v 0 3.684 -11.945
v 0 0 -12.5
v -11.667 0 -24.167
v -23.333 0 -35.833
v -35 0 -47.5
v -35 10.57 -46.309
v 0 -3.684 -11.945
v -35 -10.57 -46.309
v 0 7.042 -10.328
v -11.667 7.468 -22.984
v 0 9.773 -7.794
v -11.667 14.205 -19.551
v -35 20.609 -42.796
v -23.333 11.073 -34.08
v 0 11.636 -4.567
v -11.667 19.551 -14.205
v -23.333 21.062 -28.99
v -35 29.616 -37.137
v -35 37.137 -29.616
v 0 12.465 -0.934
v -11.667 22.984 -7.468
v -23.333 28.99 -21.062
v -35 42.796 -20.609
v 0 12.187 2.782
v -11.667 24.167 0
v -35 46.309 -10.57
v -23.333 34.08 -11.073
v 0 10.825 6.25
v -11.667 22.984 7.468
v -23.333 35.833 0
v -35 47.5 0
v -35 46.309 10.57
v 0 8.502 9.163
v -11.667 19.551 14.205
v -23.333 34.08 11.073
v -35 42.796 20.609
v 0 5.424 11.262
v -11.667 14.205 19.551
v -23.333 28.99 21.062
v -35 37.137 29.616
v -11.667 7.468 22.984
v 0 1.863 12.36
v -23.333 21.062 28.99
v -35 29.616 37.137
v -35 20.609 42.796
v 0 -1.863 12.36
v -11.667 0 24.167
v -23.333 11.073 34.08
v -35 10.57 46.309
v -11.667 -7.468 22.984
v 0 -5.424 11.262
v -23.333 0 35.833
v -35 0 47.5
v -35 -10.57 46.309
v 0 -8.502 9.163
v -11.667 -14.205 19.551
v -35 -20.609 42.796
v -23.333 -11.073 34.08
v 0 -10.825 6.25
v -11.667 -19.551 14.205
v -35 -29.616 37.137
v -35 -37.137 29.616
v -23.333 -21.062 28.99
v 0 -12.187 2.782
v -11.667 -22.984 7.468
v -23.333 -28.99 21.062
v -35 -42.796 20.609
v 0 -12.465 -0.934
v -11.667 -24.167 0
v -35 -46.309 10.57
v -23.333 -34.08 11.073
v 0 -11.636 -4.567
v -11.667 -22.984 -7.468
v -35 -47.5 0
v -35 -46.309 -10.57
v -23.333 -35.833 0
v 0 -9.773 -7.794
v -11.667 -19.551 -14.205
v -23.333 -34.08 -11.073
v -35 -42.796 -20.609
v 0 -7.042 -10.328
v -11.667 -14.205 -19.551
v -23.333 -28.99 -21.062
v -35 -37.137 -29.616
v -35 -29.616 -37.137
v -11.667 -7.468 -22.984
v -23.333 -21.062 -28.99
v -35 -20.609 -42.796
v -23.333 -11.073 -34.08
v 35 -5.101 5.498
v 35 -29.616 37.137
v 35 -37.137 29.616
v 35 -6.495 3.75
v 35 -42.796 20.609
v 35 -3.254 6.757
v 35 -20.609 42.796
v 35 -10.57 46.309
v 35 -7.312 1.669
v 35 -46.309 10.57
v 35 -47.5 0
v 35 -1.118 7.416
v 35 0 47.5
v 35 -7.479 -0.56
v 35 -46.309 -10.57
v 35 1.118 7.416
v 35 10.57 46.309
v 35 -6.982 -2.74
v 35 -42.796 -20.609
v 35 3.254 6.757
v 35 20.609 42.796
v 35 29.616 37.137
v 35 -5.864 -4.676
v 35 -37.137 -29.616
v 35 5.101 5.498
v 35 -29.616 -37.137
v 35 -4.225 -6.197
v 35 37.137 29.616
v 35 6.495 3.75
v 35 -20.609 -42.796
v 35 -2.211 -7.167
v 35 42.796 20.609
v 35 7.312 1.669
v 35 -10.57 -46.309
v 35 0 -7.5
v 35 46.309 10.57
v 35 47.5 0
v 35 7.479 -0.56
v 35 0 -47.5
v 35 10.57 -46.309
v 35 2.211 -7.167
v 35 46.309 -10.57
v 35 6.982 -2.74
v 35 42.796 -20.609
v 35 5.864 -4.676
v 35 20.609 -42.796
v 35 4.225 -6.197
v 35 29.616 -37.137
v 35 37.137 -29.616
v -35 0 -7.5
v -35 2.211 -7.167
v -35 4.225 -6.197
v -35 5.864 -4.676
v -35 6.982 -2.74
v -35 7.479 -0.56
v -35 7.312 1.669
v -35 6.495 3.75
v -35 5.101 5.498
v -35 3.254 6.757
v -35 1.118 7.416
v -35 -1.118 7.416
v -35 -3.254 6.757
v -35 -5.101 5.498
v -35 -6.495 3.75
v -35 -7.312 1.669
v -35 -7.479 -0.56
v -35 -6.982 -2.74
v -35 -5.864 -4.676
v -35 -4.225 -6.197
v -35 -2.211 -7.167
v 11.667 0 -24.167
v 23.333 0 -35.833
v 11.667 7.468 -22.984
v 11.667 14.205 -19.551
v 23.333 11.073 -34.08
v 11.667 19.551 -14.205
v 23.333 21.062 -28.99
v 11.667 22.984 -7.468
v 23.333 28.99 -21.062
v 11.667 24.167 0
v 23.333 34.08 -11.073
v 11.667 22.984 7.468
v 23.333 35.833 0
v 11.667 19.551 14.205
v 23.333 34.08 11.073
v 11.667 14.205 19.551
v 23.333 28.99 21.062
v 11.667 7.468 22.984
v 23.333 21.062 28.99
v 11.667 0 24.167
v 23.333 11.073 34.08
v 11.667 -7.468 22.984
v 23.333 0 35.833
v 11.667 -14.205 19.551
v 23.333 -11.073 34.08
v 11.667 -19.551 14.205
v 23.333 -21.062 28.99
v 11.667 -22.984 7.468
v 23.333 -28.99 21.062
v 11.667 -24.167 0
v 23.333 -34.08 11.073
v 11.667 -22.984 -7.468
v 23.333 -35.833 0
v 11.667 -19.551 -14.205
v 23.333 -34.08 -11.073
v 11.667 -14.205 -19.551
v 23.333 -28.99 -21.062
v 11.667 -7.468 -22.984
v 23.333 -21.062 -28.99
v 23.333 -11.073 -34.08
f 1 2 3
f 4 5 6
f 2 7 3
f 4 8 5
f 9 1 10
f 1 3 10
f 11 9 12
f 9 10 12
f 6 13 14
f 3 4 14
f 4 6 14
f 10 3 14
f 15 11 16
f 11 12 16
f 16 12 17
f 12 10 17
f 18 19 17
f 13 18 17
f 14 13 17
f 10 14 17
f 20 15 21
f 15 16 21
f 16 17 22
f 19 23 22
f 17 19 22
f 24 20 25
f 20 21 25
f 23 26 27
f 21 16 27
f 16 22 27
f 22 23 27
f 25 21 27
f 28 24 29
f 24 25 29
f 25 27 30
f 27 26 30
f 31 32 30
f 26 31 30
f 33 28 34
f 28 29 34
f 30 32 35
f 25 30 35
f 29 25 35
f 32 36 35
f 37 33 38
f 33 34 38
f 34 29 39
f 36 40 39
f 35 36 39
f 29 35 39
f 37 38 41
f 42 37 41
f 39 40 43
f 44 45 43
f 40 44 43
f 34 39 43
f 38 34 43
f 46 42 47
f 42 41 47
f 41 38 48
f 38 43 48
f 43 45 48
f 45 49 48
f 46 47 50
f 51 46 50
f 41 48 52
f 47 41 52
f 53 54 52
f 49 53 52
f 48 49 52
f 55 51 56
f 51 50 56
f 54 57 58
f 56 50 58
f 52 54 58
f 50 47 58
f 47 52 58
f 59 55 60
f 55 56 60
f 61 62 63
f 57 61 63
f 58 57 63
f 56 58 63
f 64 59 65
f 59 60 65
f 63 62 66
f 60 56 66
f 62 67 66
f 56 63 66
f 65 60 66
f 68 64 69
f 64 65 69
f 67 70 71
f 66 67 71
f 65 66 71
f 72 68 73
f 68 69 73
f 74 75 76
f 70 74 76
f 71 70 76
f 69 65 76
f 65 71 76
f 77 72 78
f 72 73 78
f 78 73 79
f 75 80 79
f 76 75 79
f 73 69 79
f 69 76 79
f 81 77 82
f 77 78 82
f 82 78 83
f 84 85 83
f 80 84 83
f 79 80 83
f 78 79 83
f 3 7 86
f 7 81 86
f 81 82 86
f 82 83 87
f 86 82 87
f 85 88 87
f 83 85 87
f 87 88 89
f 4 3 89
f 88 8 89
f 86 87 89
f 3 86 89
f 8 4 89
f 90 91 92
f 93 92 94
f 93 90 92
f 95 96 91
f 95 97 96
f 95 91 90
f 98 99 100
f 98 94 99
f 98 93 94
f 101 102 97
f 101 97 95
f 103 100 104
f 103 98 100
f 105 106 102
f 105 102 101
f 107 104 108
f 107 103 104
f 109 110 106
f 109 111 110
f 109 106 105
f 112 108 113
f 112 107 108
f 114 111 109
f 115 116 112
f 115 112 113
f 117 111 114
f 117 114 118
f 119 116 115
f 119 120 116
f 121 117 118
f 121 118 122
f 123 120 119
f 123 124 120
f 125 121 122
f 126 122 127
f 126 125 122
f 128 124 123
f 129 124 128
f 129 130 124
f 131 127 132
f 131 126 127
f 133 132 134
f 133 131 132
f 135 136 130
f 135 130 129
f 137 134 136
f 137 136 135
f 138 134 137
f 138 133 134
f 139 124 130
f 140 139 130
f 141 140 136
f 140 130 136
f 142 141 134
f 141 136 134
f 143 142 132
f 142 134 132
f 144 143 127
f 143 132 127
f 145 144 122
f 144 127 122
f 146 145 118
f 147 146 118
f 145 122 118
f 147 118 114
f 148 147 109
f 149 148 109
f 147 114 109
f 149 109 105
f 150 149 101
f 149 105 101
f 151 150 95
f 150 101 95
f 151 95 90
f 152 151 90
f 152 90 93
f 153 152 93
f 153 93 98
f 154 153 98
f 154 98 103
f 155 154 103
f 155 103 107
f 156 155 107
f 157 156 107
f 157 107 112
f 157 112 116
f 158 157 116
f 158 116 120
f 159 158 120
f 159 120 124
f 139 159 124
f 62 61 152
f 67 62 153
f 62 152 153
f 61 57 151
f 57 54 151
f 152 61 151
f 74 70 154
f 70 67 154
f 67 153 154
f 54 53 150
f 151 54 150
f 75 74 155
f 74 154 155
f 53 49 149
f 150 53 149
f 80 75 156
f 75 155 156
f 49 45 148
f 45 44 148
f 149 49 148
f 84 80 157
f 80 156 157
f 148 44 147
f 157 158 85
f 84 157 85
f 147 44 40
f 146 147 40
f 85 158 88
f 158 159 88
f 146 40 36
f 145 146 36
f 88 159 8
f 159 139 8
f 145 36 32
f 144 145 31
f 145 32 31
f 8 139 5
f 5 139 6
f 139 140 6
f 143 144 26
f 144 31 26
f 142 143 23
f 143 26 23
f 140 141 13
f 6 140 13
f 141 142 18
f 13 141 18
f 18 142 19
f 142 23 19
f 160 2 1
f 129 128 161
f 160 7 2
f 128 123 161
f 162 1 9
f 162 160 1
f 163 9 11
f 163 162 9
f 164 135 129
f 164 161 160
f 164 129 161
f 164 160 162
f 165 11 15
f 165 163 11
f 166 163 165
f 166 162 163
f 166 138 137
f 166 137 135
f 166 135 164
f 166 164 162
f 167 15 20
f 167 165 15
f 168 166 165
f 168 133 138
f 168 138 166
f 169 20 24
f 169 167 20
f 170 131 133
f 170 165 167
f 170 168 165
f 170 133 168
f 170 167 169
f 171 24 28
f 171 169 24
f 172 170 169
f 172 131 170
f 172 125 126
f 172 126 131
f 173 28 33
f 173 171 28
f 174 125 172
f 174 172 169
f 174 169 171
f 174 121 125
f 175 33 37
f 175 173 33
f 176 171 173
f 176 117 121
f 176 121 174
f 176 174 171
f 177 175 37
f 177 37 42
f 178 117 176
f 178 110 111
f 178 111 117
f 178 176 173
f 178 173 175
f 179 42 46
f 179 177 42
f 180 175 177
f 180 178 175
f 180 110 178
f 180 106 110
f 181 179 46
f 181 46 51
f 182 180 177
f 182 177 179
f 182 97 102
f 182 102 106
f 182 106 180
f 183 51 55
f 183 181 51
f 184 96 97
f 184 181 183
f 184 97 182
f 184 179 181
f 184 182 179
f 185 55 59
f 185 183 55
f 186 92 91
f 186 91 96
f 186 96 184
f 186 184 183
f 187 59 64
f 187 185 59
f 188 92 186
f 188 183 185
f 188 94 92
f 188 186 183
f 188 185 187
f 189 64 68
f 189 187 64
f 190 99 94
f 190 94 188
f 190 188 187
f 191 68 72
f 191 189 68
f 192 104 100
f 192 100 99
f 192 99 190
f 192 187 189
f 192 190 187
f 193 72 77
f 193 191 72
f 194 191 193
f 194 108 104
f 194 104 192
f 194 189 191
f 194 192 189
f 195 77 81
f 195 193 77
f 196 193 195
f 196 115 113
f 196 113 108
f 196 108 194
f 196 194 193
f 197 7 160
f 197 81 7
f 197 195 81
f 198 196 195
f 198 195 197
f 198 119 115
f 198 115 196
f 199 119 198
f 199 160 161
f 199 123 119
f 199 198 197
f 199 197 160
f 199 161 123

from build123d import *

# Parameters (mm, degrees)
SKETCH1_R              = 12.5
BOSS_EXTRUDE1_DEPTH    = 35
BOSS_EXTRUDE1_TAPER    = -45
SKETCH2_R              = 7.5
SUPPORT_ARM_HOLE_DEPTH = 71.0000001


with BuildPart() as part:
    # Sketch1 → Boss-Extrude1 (new body)
    with BuildSketch(Plane(origin=(0, 0, 0), x_dir=(0, 0, -1), z_dir=(1, 0, 0))):
        Circle(SKETCH1_R)
    boss_extrude1 = extrude(amount=BOSS_EXTRUDE1_DEPTH, taper=BOSS_EXTRUDE1_TAPER)

    # Mirror1: Boss-Extrude1 across plane
    add(boss_extrude1.mirror(Plane(origin=(0, 0, 0), x_dir=(0, 0, 1), z_dir=(1, 0, 0))))

    # Sketch2 → Support Arm Hole (cut, through all)
    with BuildSketch(Plane(origin=(35, 0, 0), x_dir=(0, 0, -1), z_dir=(1, 0, 0))):
        Circle(SKETCH2_R)
    extrude(amount=-SUPPORT_ARM_HOLE_DEPTH, mode=Mode.SUBTRACT)


solid = part.part
